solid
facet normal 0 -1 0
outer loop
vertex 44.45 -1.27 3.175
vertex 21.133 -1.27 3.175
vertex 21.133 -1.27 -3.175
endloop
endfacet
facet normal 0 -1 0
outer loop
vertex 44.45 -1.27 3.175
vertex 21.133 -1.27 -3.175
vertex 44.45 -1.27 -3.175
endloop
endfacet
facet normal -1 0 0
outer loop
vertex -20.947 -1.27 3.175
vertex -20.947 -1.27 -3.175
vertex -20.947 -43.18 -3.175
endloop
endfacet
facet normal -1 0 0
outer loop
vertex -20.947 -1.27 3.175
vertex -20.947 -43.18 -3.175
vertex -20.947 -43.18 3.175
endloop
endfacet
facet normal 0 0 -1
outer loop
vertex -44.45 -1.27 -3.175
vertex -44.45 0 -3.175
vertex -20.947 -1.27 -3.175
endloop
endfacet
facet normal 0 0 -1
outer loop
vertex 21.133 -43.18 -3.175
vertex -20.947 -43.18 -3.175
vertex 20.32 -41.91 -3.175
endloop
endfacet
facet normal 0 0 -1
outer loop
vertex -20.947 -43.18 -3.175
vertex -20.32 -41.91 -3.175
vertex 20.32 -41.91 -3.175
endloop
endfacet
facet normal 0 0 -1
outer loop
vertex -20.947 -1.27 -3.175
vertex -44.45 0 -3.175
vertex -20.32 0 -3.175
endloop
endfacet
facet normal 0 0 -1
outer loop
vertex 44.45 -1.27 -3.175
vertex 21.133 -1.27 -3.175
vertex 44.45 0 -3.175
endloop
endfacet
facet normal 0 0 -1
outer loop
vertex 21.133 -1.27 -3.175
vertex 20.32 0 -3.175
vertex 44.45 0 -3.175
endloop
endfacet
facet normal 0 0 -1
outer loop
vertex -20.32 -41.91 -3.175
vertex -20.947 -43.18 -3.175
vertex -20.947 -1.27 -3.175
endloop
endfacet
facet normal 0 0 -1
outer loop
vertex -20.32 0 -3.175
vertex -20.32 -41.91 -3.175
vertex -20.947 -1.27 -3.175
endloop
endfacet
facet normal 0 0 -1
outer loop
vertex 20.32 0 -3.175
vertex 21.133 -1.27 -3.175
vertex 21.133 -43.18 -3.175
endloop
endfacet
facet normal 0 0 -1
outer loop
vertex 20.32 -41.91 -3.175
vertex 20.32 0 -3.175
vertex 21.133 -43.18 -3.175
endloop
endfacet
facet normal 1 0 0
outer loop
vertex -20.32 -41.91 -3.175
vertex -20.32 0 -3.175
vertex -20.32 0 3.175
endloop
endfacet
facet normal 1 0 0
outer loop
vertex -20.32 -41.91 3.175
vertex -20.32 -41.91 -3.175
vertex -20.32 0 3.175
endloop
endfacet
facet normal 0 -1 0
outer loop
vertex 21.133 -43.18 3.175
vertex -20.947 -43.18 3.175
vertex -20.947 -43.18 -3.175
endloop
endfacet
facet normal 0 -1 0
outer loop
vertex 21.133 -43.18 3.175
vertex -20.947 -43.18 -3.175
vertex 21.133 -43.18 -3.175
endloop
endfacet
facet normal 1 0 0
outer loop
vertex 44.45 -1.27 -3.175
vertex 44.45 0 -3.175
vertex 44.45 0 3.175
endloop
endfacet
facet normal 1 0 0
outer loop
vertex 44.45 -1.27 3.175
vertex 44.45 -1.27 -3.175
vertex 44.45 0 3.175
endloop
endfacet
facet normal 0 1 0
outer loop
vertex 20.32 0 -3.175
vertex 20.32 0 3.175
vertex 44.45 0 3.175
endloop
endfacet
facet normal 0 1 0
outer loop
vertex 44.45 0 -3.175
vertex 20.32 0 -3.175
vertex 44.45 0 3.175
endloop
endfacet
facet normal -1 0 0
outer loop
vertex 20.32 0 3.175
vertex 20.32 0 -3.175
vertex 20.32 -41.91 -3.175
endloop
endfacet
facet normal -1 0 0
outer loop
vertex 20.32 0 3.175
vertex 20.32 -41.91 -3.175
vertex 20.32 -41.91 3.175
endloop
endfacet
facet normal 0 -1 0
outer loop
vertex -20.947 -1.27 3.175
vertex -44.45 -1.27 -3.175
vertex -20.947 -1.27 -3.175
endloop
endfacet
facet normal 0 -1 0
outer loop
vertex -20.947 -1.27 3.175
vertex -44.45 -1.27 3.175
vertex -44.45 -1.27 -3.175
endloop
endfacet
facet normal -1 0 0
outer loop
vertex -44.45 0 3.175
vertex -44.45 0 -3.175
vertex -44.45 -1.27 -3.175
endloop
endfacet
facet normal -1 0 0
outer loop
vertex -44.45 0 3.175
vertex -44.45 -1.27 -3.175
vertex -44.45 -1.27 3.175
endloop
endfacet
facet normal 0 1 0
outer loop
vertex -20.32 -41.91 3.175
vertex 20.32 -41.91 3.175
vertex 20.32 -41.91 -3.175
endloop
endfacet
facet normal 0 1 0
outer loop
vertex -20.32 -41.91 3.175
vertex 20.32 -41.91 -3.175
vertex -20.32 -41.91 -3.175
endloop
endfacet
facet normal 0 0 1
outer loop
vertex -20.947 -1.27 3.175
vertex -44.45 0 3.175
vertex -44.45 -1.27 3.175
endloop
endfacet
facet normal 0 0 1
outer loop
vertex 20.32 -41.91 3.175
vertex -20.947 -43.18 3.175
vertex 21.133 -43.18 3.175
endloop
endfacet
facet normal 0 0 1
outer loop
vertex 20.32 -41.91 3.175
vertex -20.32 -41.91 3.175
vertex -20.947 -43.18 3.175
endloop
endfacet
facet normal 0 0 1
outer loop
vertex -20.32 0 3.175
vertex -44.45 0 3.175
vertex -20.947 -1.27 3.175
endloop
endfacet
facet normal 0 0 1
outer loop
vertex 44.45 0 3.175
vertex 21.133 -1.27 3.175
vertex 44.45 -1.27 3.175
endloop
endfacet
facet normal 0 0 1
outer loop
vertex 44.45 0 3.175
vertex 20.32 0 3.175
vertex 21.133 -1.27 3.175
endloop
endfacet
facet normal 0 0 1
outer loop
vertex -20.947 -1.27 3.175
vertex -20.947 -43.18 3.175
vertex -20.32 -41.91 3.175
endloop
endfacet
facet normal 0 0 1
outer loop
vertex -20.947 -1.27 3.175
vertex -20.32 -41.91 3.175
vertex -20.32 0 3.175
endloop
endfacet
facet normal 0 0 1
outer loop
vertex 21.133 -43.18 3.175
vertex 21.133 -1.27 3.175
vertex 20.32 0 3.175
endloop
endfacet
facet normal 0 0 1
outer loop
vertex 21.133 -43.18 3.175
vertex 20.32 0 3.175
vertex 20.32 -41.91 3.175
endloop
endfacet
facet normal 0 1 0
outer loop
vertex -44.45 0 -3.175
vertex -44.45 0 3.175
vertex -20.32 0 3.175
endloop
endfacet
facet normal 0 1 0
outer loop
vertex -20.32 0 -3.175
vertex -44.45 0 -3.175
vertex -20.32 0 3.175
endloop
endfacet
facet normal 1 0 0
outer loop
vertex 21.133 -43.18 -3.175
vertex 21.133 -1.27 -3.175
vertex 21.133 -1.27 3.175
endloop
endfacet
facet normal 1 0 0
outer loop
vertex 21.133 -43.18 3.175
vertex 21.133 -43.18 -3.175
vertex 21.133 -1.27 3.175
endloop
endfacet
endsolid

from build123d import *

# Parameters (mm, degrees)
F0_W     = 88.9
F0_H     = 6.35
F1_DEPTH = 43.18
F2_W     = 40.64
F2_H     = 6.35
F3_DEPTH = 41.91
F4_W     = 23.5030670434
F4_H     = 6.35
F4_W_2   = 0.0459178567
F5_DEPTH = 41.91
F6_W     = 23.3165659726
F6_H     = 6.35
F7_DEPTH = 41.91


with BuildPart() as f1:
    # F0 (on Front) → F1 (new body)
    with BuildSketch(Plane.XZ):
        Rectangle(F0_W, F0_H)
    extrude(amount=F1_DEPTH)

    # F2 (on face) → F3 (cut)
    with BuildSketch(Plane(origin=(0, 0, 0), x_dir=(-1, 0, 0), z_dir=(0, 1, 0))):
        Rectangle(F2_W, F2_H)
    extrude(amount=-F3_DEPTH, mode=Mode.SUBTRACT)

    # F4 (on face) → F5 (cut)
    with BuildSketch(Plane.XZ.offset(43.18)):
        with Locations((-32.6984664783, 0)):
            Rectangle(F4_W, F4_H)
        with Locations((-44.4729589283, 0)):
            Rectangle(F4_W_2, F4_H)
    extrude(amount=-F5_DEPTH, mode=Mode.SUBTRACT)

    # F6 (on face) → F7 (cut)
    with BuildSketch(Plane.XZ.offset(43.18)):
        with Locations((32.7917170137, 0)):
            Rectangle(F6_W, F6_H)
    extrude(amount=-F7_DEPTH, mode=Mode.SUBTRACT)


solid = f1.part
